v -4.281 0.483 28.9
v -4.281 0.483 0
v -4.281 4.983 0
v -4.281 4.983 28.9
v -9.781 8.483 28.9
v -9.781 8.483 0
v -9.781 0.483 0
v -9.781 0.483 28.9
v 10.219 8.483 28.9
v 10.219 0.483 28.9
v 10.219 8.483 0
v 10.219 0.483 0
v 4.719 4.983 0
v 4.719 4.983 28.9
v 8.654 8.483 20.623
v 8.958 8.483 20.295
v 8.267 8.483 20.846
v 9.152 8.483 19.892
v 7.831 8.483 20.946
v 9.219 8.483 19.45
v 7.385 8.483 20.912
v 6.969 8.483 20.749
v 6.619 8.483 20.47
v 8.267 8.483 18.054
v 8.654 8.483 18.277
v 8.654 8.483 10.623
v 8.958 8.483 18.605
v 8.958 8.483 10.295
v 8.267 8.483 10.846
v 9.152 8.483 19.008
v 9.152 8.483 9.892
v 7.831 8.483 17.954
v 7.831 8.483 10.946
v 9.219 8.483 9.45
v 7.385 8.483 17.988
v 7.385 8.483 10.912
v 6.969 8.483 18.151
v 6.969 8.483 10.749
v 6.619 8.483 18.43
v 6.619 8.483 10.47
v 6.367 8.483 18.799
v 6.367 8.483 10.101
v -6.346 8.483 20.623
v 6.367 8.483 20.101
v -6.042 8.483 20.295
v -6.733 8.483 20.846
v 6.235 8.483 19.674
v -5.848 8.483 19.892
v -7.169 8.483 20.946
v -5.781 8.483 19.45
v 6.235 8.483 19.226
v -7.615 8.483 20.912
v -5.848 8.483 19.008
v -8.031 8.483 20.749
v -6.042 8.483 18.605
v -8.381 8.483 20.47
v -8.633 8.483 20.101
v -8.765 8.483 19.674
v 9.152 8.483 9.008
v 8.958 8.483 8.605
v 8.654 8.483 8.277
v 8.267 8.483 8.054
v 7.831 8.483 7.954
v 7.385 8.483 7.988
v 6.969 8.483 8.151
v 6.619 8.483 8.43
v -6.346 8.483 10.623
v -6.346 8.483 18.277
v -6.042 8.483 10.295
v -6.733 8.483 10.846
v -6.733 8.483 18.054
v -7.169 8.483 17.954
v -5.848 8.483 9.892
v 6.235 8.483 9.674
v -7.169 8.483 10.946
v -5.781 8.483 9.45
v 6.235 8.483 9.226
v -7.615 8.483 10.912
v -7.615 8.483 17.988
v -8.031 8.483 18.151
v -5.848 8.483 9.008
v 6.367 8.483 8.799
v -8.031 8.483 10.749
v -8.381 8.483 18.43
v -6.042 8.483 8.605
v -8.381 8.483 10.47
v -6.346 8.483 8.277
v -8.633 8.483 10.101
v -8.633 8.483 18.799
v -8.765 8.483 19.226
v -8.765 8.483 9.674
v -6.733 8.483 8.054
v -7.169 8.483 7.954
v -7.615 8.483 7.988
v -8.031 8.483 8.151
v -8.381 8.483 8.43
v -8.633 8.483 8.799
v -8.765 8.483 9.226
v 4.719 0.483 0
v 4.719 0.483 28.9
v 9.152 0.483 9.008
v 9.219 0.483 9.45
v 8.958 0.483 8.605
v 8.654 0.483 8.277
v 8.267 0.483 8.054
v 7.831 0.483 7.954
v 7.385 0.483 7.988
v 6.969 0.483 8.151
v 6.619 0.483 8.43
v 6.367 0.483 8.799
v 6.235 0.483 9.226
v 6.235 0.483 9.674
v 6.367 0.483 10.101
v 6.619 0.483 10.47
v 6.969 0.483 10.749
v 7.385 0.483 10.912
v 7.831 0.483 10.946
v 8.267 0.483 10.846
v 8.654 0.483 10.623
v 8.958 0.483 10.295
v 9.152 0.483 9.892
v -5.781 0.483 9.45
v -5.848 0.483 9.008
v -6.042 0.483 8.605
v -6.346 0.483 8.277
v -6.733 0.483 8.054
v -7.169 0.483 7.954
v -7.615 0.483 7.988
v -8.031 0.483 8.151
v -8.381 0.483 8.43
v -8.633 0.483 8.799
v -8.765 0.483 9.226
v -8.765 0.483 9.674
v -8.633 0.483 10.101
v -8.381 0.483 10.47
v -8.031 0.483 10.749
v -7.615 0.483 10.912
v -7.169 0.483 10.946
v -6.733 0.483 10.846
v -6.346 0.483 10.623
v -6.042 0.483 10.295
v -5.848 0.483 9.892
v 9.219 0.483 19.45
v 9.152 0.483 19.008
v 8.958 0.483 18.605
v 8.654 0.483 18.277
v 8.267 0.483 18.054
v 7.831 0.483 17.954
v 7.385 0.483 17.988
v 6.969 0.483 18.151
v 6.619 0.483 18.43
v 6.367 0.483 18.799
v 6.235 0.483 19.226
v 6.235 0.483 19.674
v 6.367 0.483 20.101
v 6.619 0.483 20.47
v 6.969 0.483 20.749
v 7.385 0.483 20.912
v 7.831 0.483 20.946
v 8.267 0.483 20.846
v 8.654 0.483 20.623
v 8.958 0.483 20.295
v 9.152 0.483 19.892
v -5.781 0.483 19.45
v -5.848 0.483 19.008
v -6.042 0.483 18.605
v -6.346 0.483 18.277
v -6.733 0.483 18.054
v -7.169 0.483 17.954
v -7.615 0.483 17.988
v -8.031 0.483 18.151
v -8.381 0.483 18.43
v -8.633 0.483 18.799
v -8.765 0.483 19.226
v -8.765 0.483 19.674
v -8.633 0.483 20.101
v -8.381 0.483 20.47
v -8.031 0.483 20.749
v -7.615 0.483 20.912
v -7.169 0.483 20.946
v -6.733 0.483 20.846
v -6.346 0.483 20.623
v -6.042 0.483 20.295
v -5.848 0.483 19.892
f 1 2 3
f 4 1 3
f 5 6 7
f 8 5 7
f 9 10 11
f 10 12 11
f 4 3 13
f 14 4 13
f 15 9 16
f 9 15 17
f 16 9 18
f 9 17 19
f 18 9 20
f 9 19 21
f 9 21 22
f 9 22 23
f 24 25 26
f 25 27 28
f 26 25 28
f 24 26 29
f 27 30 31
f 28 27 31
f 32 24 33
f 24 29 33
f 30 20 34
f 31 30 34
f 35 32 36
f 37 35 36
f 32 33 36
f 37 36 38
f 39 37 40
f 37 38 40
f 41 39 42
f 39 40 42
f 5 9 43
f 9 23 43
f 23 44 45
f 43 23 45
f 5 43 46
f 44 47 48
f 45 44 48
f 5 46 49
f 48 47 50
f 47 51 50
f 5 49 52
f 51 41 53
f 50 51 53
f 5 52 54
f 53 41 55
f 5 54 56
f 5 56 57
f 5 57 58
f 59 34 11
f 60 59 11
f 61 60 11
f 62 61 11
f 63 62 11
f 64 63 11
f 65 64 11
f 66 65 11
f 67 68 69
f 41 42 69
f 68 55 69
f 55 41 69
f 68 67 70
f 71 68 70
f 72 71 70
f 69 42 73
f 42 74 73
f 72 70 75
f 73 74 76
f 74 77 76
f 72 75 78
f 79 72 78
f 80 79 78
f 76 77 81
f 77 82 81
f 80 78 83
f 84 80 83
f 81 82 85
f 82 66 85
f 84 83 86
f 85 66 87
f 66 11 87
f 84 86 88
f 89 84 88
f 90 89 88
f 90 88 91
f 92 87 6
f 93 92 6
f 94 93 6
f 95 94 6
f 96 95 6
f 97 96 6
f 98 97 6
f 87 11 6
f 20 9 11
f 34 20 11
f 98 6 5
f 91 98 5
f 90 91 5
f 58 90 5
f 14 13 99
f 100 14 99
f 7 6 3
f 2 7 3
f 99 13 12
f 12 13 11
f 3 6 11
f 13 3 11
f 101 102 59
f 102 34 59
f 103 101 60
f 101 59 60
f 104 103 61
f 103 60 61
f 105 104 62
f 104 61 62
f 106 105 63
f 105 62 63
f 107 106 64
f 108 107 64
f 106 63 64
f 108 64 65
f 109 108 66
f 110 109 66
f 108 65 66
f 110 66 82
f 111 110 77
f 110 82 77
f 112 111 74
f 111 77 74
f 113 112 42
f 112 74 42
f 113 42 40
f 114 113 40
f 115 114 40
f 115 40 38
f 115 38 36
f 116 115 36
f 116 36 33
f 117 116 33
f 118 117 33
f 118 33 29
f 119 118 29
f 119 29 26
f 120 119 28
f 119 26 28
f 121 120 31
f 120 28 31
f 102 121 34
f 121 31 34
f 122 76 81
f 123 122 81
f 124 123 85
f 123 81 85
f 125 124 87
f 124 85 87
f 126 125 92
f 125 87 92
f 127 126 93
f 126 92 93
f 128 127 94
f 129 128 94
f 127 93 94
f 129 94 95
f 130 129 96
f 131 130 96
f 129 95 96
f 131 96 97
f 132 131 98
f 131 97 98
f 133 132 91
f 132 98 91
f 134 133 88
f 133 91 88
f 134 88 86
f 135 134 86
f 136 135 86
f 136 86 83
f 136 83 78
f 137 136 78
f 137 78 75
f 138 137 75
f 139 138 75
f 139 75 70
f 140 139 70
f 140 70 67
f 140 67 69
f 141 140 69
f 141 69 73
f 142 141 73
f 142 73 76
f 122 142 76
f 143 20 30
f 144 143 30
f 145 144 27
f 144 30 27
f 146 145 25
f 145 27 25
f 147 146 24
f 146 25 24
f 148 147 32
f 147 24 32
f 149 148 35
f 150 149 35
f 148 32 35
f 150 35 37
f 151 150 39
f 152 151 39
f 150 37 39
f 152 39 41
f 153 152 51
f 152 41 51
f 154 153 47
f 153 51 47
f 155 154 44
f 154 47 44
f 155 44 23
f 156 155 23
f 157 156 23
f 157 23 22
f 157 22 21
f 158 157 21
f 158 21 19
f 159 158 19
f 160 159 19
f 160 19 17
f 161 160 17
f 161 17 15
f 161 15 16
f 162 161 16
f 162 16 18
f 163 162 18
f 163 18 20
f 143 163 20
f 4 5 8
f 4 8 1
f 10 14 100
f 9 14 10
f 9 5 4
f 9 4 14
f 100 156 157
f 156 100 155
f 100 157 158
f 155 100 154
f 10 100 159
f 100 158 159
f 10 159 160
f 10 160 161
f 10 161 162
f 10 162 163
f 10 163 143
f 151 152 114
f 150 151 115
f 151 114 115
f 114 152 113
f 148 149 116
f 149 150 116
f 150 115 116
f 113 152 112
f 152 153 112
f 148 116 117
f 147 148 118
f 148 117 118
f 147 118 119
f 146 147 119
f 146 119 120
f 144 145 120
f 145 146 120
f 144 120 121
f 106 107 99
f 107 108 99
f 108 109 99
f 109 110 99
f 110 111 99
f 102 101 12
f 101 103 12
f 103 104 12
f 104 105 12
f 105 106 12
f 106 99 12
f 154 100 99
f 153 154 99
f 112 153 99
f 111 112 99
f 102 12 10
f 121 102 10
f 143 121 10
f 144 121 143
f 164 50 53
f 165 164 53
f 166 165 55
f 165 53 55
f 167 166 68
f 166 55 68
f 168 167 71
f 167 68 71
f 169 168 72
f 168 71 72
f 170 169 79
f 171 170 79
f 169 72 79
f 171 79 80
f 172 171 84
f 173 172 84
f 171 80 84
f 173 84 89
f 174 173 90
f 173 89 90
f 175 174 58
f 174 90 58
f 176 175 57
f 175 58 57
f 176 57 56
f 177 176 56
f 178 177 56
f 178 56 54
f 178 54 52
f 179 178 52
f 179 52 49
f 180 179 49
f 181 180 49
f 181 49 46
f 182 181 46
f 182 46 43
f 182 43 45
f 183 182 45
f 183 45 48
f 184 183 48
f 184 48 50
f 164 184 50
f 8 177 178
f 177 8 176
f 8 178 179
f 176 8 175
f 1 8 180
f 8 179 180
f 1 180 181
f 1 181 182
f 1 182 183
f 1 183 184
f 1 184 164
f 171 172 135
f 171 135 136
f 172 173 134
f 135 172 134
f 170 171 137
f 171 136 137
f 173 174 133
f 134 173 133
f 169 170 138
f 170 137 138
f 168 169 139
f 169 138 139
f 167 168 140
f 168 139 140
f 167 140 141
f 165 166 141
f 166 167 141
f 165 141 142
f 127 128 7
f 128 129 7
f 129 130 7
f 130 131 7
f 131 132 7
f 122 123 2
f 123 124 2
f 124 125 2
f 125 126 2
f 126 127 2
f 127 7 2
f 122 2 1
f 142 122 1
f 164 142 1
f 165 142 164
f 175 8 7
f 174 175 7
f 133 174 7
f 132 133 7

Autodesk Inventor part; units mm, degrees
ref_plane "YZ Plane" through (0, 0, 0) normal (1, 0, 0) x (0, 1, 0)
ref_plane "XZ Plane" through (0, 0, 0) normal (0, 1, 0) x (-1, 0, 0)
ref_plane "XY Plane" through (0, 0, 0) normal (0, 0, 1) x (1, 0, 0)
sketch "Sketch1" plane through (0, 0, 0) normal (0, 0, 1) x (1, 0, 0)
  line L0 (-9.7813, 0.4833) -> (-4.2813, 0.4833)
  line L1 (-4.2813, 0.4833) -> (-4.2813, 4.9833)
  line L2 (-4.2813, 4.9833) -> (4.7187, 4.9833)
  line L3 (4.7187, 4.9833) -> (4.7187, 0.4833)
  line L4 (4.7187, 0.4833) -> (10.2187, 0.4833)
  line L5 (10.2187, 0.4833) -> (10.2187, 8.4833)
  line L6 (10.2187, 8.4833) -> (-9.7813, 8.4833)
  line L7 (-9.7813, 8.4833) -> (-9.7813, 0.4833)
  point P0 (0, 0)
  dimension "d0" = 20
  dimension "d1" = 8
  dimension "d2" = 4.5
  dimension "d3" = 9
  dimension "d4" = 5.5
extrude "Extrusion1" add sketch "Sketch1" along normal blind 28.9
sketch "Sketch2" plane through (-9.7813, 8.4833, 0) normal (0, 1, 0) x (1, 0, 0)
  circle A0 centre (2.5, -9.45) radius 1.5
  circle A1 centre (17.5, -9.45) radius 1.5
  circle A2 centre (17.5, -19.45) radius 1.5
  circle A3 centre (2.5, -19.45) radius 1.5
  line L0 (20, 0) -> (0, 0) projected
  line L1 (0, 0) -> (0, -28.9) projected
  line L2 (20, 0) -> (20, -28.9) projected
  point P0 (9.7813, 0)
  dimension "d7" = 3
  dimension "d8" = 3
  dimension "d9" = 3
  dimension "d10" = 3
  dimension "d11" = 9.45
  dimension "d12" = 9.45
  dimension "d13" = 10
  dimension "d14" = 10
  dimension "d15" = 2.5
  dimension "d16" = 2.5
  dimension "d18" = 2.5
  dimension "d19" = 2.5
extrude "Extrusion2" cut sketch "Sketch2" against normal blind 8
properties part number "MGN9C_block" material "ABS Plastic"
